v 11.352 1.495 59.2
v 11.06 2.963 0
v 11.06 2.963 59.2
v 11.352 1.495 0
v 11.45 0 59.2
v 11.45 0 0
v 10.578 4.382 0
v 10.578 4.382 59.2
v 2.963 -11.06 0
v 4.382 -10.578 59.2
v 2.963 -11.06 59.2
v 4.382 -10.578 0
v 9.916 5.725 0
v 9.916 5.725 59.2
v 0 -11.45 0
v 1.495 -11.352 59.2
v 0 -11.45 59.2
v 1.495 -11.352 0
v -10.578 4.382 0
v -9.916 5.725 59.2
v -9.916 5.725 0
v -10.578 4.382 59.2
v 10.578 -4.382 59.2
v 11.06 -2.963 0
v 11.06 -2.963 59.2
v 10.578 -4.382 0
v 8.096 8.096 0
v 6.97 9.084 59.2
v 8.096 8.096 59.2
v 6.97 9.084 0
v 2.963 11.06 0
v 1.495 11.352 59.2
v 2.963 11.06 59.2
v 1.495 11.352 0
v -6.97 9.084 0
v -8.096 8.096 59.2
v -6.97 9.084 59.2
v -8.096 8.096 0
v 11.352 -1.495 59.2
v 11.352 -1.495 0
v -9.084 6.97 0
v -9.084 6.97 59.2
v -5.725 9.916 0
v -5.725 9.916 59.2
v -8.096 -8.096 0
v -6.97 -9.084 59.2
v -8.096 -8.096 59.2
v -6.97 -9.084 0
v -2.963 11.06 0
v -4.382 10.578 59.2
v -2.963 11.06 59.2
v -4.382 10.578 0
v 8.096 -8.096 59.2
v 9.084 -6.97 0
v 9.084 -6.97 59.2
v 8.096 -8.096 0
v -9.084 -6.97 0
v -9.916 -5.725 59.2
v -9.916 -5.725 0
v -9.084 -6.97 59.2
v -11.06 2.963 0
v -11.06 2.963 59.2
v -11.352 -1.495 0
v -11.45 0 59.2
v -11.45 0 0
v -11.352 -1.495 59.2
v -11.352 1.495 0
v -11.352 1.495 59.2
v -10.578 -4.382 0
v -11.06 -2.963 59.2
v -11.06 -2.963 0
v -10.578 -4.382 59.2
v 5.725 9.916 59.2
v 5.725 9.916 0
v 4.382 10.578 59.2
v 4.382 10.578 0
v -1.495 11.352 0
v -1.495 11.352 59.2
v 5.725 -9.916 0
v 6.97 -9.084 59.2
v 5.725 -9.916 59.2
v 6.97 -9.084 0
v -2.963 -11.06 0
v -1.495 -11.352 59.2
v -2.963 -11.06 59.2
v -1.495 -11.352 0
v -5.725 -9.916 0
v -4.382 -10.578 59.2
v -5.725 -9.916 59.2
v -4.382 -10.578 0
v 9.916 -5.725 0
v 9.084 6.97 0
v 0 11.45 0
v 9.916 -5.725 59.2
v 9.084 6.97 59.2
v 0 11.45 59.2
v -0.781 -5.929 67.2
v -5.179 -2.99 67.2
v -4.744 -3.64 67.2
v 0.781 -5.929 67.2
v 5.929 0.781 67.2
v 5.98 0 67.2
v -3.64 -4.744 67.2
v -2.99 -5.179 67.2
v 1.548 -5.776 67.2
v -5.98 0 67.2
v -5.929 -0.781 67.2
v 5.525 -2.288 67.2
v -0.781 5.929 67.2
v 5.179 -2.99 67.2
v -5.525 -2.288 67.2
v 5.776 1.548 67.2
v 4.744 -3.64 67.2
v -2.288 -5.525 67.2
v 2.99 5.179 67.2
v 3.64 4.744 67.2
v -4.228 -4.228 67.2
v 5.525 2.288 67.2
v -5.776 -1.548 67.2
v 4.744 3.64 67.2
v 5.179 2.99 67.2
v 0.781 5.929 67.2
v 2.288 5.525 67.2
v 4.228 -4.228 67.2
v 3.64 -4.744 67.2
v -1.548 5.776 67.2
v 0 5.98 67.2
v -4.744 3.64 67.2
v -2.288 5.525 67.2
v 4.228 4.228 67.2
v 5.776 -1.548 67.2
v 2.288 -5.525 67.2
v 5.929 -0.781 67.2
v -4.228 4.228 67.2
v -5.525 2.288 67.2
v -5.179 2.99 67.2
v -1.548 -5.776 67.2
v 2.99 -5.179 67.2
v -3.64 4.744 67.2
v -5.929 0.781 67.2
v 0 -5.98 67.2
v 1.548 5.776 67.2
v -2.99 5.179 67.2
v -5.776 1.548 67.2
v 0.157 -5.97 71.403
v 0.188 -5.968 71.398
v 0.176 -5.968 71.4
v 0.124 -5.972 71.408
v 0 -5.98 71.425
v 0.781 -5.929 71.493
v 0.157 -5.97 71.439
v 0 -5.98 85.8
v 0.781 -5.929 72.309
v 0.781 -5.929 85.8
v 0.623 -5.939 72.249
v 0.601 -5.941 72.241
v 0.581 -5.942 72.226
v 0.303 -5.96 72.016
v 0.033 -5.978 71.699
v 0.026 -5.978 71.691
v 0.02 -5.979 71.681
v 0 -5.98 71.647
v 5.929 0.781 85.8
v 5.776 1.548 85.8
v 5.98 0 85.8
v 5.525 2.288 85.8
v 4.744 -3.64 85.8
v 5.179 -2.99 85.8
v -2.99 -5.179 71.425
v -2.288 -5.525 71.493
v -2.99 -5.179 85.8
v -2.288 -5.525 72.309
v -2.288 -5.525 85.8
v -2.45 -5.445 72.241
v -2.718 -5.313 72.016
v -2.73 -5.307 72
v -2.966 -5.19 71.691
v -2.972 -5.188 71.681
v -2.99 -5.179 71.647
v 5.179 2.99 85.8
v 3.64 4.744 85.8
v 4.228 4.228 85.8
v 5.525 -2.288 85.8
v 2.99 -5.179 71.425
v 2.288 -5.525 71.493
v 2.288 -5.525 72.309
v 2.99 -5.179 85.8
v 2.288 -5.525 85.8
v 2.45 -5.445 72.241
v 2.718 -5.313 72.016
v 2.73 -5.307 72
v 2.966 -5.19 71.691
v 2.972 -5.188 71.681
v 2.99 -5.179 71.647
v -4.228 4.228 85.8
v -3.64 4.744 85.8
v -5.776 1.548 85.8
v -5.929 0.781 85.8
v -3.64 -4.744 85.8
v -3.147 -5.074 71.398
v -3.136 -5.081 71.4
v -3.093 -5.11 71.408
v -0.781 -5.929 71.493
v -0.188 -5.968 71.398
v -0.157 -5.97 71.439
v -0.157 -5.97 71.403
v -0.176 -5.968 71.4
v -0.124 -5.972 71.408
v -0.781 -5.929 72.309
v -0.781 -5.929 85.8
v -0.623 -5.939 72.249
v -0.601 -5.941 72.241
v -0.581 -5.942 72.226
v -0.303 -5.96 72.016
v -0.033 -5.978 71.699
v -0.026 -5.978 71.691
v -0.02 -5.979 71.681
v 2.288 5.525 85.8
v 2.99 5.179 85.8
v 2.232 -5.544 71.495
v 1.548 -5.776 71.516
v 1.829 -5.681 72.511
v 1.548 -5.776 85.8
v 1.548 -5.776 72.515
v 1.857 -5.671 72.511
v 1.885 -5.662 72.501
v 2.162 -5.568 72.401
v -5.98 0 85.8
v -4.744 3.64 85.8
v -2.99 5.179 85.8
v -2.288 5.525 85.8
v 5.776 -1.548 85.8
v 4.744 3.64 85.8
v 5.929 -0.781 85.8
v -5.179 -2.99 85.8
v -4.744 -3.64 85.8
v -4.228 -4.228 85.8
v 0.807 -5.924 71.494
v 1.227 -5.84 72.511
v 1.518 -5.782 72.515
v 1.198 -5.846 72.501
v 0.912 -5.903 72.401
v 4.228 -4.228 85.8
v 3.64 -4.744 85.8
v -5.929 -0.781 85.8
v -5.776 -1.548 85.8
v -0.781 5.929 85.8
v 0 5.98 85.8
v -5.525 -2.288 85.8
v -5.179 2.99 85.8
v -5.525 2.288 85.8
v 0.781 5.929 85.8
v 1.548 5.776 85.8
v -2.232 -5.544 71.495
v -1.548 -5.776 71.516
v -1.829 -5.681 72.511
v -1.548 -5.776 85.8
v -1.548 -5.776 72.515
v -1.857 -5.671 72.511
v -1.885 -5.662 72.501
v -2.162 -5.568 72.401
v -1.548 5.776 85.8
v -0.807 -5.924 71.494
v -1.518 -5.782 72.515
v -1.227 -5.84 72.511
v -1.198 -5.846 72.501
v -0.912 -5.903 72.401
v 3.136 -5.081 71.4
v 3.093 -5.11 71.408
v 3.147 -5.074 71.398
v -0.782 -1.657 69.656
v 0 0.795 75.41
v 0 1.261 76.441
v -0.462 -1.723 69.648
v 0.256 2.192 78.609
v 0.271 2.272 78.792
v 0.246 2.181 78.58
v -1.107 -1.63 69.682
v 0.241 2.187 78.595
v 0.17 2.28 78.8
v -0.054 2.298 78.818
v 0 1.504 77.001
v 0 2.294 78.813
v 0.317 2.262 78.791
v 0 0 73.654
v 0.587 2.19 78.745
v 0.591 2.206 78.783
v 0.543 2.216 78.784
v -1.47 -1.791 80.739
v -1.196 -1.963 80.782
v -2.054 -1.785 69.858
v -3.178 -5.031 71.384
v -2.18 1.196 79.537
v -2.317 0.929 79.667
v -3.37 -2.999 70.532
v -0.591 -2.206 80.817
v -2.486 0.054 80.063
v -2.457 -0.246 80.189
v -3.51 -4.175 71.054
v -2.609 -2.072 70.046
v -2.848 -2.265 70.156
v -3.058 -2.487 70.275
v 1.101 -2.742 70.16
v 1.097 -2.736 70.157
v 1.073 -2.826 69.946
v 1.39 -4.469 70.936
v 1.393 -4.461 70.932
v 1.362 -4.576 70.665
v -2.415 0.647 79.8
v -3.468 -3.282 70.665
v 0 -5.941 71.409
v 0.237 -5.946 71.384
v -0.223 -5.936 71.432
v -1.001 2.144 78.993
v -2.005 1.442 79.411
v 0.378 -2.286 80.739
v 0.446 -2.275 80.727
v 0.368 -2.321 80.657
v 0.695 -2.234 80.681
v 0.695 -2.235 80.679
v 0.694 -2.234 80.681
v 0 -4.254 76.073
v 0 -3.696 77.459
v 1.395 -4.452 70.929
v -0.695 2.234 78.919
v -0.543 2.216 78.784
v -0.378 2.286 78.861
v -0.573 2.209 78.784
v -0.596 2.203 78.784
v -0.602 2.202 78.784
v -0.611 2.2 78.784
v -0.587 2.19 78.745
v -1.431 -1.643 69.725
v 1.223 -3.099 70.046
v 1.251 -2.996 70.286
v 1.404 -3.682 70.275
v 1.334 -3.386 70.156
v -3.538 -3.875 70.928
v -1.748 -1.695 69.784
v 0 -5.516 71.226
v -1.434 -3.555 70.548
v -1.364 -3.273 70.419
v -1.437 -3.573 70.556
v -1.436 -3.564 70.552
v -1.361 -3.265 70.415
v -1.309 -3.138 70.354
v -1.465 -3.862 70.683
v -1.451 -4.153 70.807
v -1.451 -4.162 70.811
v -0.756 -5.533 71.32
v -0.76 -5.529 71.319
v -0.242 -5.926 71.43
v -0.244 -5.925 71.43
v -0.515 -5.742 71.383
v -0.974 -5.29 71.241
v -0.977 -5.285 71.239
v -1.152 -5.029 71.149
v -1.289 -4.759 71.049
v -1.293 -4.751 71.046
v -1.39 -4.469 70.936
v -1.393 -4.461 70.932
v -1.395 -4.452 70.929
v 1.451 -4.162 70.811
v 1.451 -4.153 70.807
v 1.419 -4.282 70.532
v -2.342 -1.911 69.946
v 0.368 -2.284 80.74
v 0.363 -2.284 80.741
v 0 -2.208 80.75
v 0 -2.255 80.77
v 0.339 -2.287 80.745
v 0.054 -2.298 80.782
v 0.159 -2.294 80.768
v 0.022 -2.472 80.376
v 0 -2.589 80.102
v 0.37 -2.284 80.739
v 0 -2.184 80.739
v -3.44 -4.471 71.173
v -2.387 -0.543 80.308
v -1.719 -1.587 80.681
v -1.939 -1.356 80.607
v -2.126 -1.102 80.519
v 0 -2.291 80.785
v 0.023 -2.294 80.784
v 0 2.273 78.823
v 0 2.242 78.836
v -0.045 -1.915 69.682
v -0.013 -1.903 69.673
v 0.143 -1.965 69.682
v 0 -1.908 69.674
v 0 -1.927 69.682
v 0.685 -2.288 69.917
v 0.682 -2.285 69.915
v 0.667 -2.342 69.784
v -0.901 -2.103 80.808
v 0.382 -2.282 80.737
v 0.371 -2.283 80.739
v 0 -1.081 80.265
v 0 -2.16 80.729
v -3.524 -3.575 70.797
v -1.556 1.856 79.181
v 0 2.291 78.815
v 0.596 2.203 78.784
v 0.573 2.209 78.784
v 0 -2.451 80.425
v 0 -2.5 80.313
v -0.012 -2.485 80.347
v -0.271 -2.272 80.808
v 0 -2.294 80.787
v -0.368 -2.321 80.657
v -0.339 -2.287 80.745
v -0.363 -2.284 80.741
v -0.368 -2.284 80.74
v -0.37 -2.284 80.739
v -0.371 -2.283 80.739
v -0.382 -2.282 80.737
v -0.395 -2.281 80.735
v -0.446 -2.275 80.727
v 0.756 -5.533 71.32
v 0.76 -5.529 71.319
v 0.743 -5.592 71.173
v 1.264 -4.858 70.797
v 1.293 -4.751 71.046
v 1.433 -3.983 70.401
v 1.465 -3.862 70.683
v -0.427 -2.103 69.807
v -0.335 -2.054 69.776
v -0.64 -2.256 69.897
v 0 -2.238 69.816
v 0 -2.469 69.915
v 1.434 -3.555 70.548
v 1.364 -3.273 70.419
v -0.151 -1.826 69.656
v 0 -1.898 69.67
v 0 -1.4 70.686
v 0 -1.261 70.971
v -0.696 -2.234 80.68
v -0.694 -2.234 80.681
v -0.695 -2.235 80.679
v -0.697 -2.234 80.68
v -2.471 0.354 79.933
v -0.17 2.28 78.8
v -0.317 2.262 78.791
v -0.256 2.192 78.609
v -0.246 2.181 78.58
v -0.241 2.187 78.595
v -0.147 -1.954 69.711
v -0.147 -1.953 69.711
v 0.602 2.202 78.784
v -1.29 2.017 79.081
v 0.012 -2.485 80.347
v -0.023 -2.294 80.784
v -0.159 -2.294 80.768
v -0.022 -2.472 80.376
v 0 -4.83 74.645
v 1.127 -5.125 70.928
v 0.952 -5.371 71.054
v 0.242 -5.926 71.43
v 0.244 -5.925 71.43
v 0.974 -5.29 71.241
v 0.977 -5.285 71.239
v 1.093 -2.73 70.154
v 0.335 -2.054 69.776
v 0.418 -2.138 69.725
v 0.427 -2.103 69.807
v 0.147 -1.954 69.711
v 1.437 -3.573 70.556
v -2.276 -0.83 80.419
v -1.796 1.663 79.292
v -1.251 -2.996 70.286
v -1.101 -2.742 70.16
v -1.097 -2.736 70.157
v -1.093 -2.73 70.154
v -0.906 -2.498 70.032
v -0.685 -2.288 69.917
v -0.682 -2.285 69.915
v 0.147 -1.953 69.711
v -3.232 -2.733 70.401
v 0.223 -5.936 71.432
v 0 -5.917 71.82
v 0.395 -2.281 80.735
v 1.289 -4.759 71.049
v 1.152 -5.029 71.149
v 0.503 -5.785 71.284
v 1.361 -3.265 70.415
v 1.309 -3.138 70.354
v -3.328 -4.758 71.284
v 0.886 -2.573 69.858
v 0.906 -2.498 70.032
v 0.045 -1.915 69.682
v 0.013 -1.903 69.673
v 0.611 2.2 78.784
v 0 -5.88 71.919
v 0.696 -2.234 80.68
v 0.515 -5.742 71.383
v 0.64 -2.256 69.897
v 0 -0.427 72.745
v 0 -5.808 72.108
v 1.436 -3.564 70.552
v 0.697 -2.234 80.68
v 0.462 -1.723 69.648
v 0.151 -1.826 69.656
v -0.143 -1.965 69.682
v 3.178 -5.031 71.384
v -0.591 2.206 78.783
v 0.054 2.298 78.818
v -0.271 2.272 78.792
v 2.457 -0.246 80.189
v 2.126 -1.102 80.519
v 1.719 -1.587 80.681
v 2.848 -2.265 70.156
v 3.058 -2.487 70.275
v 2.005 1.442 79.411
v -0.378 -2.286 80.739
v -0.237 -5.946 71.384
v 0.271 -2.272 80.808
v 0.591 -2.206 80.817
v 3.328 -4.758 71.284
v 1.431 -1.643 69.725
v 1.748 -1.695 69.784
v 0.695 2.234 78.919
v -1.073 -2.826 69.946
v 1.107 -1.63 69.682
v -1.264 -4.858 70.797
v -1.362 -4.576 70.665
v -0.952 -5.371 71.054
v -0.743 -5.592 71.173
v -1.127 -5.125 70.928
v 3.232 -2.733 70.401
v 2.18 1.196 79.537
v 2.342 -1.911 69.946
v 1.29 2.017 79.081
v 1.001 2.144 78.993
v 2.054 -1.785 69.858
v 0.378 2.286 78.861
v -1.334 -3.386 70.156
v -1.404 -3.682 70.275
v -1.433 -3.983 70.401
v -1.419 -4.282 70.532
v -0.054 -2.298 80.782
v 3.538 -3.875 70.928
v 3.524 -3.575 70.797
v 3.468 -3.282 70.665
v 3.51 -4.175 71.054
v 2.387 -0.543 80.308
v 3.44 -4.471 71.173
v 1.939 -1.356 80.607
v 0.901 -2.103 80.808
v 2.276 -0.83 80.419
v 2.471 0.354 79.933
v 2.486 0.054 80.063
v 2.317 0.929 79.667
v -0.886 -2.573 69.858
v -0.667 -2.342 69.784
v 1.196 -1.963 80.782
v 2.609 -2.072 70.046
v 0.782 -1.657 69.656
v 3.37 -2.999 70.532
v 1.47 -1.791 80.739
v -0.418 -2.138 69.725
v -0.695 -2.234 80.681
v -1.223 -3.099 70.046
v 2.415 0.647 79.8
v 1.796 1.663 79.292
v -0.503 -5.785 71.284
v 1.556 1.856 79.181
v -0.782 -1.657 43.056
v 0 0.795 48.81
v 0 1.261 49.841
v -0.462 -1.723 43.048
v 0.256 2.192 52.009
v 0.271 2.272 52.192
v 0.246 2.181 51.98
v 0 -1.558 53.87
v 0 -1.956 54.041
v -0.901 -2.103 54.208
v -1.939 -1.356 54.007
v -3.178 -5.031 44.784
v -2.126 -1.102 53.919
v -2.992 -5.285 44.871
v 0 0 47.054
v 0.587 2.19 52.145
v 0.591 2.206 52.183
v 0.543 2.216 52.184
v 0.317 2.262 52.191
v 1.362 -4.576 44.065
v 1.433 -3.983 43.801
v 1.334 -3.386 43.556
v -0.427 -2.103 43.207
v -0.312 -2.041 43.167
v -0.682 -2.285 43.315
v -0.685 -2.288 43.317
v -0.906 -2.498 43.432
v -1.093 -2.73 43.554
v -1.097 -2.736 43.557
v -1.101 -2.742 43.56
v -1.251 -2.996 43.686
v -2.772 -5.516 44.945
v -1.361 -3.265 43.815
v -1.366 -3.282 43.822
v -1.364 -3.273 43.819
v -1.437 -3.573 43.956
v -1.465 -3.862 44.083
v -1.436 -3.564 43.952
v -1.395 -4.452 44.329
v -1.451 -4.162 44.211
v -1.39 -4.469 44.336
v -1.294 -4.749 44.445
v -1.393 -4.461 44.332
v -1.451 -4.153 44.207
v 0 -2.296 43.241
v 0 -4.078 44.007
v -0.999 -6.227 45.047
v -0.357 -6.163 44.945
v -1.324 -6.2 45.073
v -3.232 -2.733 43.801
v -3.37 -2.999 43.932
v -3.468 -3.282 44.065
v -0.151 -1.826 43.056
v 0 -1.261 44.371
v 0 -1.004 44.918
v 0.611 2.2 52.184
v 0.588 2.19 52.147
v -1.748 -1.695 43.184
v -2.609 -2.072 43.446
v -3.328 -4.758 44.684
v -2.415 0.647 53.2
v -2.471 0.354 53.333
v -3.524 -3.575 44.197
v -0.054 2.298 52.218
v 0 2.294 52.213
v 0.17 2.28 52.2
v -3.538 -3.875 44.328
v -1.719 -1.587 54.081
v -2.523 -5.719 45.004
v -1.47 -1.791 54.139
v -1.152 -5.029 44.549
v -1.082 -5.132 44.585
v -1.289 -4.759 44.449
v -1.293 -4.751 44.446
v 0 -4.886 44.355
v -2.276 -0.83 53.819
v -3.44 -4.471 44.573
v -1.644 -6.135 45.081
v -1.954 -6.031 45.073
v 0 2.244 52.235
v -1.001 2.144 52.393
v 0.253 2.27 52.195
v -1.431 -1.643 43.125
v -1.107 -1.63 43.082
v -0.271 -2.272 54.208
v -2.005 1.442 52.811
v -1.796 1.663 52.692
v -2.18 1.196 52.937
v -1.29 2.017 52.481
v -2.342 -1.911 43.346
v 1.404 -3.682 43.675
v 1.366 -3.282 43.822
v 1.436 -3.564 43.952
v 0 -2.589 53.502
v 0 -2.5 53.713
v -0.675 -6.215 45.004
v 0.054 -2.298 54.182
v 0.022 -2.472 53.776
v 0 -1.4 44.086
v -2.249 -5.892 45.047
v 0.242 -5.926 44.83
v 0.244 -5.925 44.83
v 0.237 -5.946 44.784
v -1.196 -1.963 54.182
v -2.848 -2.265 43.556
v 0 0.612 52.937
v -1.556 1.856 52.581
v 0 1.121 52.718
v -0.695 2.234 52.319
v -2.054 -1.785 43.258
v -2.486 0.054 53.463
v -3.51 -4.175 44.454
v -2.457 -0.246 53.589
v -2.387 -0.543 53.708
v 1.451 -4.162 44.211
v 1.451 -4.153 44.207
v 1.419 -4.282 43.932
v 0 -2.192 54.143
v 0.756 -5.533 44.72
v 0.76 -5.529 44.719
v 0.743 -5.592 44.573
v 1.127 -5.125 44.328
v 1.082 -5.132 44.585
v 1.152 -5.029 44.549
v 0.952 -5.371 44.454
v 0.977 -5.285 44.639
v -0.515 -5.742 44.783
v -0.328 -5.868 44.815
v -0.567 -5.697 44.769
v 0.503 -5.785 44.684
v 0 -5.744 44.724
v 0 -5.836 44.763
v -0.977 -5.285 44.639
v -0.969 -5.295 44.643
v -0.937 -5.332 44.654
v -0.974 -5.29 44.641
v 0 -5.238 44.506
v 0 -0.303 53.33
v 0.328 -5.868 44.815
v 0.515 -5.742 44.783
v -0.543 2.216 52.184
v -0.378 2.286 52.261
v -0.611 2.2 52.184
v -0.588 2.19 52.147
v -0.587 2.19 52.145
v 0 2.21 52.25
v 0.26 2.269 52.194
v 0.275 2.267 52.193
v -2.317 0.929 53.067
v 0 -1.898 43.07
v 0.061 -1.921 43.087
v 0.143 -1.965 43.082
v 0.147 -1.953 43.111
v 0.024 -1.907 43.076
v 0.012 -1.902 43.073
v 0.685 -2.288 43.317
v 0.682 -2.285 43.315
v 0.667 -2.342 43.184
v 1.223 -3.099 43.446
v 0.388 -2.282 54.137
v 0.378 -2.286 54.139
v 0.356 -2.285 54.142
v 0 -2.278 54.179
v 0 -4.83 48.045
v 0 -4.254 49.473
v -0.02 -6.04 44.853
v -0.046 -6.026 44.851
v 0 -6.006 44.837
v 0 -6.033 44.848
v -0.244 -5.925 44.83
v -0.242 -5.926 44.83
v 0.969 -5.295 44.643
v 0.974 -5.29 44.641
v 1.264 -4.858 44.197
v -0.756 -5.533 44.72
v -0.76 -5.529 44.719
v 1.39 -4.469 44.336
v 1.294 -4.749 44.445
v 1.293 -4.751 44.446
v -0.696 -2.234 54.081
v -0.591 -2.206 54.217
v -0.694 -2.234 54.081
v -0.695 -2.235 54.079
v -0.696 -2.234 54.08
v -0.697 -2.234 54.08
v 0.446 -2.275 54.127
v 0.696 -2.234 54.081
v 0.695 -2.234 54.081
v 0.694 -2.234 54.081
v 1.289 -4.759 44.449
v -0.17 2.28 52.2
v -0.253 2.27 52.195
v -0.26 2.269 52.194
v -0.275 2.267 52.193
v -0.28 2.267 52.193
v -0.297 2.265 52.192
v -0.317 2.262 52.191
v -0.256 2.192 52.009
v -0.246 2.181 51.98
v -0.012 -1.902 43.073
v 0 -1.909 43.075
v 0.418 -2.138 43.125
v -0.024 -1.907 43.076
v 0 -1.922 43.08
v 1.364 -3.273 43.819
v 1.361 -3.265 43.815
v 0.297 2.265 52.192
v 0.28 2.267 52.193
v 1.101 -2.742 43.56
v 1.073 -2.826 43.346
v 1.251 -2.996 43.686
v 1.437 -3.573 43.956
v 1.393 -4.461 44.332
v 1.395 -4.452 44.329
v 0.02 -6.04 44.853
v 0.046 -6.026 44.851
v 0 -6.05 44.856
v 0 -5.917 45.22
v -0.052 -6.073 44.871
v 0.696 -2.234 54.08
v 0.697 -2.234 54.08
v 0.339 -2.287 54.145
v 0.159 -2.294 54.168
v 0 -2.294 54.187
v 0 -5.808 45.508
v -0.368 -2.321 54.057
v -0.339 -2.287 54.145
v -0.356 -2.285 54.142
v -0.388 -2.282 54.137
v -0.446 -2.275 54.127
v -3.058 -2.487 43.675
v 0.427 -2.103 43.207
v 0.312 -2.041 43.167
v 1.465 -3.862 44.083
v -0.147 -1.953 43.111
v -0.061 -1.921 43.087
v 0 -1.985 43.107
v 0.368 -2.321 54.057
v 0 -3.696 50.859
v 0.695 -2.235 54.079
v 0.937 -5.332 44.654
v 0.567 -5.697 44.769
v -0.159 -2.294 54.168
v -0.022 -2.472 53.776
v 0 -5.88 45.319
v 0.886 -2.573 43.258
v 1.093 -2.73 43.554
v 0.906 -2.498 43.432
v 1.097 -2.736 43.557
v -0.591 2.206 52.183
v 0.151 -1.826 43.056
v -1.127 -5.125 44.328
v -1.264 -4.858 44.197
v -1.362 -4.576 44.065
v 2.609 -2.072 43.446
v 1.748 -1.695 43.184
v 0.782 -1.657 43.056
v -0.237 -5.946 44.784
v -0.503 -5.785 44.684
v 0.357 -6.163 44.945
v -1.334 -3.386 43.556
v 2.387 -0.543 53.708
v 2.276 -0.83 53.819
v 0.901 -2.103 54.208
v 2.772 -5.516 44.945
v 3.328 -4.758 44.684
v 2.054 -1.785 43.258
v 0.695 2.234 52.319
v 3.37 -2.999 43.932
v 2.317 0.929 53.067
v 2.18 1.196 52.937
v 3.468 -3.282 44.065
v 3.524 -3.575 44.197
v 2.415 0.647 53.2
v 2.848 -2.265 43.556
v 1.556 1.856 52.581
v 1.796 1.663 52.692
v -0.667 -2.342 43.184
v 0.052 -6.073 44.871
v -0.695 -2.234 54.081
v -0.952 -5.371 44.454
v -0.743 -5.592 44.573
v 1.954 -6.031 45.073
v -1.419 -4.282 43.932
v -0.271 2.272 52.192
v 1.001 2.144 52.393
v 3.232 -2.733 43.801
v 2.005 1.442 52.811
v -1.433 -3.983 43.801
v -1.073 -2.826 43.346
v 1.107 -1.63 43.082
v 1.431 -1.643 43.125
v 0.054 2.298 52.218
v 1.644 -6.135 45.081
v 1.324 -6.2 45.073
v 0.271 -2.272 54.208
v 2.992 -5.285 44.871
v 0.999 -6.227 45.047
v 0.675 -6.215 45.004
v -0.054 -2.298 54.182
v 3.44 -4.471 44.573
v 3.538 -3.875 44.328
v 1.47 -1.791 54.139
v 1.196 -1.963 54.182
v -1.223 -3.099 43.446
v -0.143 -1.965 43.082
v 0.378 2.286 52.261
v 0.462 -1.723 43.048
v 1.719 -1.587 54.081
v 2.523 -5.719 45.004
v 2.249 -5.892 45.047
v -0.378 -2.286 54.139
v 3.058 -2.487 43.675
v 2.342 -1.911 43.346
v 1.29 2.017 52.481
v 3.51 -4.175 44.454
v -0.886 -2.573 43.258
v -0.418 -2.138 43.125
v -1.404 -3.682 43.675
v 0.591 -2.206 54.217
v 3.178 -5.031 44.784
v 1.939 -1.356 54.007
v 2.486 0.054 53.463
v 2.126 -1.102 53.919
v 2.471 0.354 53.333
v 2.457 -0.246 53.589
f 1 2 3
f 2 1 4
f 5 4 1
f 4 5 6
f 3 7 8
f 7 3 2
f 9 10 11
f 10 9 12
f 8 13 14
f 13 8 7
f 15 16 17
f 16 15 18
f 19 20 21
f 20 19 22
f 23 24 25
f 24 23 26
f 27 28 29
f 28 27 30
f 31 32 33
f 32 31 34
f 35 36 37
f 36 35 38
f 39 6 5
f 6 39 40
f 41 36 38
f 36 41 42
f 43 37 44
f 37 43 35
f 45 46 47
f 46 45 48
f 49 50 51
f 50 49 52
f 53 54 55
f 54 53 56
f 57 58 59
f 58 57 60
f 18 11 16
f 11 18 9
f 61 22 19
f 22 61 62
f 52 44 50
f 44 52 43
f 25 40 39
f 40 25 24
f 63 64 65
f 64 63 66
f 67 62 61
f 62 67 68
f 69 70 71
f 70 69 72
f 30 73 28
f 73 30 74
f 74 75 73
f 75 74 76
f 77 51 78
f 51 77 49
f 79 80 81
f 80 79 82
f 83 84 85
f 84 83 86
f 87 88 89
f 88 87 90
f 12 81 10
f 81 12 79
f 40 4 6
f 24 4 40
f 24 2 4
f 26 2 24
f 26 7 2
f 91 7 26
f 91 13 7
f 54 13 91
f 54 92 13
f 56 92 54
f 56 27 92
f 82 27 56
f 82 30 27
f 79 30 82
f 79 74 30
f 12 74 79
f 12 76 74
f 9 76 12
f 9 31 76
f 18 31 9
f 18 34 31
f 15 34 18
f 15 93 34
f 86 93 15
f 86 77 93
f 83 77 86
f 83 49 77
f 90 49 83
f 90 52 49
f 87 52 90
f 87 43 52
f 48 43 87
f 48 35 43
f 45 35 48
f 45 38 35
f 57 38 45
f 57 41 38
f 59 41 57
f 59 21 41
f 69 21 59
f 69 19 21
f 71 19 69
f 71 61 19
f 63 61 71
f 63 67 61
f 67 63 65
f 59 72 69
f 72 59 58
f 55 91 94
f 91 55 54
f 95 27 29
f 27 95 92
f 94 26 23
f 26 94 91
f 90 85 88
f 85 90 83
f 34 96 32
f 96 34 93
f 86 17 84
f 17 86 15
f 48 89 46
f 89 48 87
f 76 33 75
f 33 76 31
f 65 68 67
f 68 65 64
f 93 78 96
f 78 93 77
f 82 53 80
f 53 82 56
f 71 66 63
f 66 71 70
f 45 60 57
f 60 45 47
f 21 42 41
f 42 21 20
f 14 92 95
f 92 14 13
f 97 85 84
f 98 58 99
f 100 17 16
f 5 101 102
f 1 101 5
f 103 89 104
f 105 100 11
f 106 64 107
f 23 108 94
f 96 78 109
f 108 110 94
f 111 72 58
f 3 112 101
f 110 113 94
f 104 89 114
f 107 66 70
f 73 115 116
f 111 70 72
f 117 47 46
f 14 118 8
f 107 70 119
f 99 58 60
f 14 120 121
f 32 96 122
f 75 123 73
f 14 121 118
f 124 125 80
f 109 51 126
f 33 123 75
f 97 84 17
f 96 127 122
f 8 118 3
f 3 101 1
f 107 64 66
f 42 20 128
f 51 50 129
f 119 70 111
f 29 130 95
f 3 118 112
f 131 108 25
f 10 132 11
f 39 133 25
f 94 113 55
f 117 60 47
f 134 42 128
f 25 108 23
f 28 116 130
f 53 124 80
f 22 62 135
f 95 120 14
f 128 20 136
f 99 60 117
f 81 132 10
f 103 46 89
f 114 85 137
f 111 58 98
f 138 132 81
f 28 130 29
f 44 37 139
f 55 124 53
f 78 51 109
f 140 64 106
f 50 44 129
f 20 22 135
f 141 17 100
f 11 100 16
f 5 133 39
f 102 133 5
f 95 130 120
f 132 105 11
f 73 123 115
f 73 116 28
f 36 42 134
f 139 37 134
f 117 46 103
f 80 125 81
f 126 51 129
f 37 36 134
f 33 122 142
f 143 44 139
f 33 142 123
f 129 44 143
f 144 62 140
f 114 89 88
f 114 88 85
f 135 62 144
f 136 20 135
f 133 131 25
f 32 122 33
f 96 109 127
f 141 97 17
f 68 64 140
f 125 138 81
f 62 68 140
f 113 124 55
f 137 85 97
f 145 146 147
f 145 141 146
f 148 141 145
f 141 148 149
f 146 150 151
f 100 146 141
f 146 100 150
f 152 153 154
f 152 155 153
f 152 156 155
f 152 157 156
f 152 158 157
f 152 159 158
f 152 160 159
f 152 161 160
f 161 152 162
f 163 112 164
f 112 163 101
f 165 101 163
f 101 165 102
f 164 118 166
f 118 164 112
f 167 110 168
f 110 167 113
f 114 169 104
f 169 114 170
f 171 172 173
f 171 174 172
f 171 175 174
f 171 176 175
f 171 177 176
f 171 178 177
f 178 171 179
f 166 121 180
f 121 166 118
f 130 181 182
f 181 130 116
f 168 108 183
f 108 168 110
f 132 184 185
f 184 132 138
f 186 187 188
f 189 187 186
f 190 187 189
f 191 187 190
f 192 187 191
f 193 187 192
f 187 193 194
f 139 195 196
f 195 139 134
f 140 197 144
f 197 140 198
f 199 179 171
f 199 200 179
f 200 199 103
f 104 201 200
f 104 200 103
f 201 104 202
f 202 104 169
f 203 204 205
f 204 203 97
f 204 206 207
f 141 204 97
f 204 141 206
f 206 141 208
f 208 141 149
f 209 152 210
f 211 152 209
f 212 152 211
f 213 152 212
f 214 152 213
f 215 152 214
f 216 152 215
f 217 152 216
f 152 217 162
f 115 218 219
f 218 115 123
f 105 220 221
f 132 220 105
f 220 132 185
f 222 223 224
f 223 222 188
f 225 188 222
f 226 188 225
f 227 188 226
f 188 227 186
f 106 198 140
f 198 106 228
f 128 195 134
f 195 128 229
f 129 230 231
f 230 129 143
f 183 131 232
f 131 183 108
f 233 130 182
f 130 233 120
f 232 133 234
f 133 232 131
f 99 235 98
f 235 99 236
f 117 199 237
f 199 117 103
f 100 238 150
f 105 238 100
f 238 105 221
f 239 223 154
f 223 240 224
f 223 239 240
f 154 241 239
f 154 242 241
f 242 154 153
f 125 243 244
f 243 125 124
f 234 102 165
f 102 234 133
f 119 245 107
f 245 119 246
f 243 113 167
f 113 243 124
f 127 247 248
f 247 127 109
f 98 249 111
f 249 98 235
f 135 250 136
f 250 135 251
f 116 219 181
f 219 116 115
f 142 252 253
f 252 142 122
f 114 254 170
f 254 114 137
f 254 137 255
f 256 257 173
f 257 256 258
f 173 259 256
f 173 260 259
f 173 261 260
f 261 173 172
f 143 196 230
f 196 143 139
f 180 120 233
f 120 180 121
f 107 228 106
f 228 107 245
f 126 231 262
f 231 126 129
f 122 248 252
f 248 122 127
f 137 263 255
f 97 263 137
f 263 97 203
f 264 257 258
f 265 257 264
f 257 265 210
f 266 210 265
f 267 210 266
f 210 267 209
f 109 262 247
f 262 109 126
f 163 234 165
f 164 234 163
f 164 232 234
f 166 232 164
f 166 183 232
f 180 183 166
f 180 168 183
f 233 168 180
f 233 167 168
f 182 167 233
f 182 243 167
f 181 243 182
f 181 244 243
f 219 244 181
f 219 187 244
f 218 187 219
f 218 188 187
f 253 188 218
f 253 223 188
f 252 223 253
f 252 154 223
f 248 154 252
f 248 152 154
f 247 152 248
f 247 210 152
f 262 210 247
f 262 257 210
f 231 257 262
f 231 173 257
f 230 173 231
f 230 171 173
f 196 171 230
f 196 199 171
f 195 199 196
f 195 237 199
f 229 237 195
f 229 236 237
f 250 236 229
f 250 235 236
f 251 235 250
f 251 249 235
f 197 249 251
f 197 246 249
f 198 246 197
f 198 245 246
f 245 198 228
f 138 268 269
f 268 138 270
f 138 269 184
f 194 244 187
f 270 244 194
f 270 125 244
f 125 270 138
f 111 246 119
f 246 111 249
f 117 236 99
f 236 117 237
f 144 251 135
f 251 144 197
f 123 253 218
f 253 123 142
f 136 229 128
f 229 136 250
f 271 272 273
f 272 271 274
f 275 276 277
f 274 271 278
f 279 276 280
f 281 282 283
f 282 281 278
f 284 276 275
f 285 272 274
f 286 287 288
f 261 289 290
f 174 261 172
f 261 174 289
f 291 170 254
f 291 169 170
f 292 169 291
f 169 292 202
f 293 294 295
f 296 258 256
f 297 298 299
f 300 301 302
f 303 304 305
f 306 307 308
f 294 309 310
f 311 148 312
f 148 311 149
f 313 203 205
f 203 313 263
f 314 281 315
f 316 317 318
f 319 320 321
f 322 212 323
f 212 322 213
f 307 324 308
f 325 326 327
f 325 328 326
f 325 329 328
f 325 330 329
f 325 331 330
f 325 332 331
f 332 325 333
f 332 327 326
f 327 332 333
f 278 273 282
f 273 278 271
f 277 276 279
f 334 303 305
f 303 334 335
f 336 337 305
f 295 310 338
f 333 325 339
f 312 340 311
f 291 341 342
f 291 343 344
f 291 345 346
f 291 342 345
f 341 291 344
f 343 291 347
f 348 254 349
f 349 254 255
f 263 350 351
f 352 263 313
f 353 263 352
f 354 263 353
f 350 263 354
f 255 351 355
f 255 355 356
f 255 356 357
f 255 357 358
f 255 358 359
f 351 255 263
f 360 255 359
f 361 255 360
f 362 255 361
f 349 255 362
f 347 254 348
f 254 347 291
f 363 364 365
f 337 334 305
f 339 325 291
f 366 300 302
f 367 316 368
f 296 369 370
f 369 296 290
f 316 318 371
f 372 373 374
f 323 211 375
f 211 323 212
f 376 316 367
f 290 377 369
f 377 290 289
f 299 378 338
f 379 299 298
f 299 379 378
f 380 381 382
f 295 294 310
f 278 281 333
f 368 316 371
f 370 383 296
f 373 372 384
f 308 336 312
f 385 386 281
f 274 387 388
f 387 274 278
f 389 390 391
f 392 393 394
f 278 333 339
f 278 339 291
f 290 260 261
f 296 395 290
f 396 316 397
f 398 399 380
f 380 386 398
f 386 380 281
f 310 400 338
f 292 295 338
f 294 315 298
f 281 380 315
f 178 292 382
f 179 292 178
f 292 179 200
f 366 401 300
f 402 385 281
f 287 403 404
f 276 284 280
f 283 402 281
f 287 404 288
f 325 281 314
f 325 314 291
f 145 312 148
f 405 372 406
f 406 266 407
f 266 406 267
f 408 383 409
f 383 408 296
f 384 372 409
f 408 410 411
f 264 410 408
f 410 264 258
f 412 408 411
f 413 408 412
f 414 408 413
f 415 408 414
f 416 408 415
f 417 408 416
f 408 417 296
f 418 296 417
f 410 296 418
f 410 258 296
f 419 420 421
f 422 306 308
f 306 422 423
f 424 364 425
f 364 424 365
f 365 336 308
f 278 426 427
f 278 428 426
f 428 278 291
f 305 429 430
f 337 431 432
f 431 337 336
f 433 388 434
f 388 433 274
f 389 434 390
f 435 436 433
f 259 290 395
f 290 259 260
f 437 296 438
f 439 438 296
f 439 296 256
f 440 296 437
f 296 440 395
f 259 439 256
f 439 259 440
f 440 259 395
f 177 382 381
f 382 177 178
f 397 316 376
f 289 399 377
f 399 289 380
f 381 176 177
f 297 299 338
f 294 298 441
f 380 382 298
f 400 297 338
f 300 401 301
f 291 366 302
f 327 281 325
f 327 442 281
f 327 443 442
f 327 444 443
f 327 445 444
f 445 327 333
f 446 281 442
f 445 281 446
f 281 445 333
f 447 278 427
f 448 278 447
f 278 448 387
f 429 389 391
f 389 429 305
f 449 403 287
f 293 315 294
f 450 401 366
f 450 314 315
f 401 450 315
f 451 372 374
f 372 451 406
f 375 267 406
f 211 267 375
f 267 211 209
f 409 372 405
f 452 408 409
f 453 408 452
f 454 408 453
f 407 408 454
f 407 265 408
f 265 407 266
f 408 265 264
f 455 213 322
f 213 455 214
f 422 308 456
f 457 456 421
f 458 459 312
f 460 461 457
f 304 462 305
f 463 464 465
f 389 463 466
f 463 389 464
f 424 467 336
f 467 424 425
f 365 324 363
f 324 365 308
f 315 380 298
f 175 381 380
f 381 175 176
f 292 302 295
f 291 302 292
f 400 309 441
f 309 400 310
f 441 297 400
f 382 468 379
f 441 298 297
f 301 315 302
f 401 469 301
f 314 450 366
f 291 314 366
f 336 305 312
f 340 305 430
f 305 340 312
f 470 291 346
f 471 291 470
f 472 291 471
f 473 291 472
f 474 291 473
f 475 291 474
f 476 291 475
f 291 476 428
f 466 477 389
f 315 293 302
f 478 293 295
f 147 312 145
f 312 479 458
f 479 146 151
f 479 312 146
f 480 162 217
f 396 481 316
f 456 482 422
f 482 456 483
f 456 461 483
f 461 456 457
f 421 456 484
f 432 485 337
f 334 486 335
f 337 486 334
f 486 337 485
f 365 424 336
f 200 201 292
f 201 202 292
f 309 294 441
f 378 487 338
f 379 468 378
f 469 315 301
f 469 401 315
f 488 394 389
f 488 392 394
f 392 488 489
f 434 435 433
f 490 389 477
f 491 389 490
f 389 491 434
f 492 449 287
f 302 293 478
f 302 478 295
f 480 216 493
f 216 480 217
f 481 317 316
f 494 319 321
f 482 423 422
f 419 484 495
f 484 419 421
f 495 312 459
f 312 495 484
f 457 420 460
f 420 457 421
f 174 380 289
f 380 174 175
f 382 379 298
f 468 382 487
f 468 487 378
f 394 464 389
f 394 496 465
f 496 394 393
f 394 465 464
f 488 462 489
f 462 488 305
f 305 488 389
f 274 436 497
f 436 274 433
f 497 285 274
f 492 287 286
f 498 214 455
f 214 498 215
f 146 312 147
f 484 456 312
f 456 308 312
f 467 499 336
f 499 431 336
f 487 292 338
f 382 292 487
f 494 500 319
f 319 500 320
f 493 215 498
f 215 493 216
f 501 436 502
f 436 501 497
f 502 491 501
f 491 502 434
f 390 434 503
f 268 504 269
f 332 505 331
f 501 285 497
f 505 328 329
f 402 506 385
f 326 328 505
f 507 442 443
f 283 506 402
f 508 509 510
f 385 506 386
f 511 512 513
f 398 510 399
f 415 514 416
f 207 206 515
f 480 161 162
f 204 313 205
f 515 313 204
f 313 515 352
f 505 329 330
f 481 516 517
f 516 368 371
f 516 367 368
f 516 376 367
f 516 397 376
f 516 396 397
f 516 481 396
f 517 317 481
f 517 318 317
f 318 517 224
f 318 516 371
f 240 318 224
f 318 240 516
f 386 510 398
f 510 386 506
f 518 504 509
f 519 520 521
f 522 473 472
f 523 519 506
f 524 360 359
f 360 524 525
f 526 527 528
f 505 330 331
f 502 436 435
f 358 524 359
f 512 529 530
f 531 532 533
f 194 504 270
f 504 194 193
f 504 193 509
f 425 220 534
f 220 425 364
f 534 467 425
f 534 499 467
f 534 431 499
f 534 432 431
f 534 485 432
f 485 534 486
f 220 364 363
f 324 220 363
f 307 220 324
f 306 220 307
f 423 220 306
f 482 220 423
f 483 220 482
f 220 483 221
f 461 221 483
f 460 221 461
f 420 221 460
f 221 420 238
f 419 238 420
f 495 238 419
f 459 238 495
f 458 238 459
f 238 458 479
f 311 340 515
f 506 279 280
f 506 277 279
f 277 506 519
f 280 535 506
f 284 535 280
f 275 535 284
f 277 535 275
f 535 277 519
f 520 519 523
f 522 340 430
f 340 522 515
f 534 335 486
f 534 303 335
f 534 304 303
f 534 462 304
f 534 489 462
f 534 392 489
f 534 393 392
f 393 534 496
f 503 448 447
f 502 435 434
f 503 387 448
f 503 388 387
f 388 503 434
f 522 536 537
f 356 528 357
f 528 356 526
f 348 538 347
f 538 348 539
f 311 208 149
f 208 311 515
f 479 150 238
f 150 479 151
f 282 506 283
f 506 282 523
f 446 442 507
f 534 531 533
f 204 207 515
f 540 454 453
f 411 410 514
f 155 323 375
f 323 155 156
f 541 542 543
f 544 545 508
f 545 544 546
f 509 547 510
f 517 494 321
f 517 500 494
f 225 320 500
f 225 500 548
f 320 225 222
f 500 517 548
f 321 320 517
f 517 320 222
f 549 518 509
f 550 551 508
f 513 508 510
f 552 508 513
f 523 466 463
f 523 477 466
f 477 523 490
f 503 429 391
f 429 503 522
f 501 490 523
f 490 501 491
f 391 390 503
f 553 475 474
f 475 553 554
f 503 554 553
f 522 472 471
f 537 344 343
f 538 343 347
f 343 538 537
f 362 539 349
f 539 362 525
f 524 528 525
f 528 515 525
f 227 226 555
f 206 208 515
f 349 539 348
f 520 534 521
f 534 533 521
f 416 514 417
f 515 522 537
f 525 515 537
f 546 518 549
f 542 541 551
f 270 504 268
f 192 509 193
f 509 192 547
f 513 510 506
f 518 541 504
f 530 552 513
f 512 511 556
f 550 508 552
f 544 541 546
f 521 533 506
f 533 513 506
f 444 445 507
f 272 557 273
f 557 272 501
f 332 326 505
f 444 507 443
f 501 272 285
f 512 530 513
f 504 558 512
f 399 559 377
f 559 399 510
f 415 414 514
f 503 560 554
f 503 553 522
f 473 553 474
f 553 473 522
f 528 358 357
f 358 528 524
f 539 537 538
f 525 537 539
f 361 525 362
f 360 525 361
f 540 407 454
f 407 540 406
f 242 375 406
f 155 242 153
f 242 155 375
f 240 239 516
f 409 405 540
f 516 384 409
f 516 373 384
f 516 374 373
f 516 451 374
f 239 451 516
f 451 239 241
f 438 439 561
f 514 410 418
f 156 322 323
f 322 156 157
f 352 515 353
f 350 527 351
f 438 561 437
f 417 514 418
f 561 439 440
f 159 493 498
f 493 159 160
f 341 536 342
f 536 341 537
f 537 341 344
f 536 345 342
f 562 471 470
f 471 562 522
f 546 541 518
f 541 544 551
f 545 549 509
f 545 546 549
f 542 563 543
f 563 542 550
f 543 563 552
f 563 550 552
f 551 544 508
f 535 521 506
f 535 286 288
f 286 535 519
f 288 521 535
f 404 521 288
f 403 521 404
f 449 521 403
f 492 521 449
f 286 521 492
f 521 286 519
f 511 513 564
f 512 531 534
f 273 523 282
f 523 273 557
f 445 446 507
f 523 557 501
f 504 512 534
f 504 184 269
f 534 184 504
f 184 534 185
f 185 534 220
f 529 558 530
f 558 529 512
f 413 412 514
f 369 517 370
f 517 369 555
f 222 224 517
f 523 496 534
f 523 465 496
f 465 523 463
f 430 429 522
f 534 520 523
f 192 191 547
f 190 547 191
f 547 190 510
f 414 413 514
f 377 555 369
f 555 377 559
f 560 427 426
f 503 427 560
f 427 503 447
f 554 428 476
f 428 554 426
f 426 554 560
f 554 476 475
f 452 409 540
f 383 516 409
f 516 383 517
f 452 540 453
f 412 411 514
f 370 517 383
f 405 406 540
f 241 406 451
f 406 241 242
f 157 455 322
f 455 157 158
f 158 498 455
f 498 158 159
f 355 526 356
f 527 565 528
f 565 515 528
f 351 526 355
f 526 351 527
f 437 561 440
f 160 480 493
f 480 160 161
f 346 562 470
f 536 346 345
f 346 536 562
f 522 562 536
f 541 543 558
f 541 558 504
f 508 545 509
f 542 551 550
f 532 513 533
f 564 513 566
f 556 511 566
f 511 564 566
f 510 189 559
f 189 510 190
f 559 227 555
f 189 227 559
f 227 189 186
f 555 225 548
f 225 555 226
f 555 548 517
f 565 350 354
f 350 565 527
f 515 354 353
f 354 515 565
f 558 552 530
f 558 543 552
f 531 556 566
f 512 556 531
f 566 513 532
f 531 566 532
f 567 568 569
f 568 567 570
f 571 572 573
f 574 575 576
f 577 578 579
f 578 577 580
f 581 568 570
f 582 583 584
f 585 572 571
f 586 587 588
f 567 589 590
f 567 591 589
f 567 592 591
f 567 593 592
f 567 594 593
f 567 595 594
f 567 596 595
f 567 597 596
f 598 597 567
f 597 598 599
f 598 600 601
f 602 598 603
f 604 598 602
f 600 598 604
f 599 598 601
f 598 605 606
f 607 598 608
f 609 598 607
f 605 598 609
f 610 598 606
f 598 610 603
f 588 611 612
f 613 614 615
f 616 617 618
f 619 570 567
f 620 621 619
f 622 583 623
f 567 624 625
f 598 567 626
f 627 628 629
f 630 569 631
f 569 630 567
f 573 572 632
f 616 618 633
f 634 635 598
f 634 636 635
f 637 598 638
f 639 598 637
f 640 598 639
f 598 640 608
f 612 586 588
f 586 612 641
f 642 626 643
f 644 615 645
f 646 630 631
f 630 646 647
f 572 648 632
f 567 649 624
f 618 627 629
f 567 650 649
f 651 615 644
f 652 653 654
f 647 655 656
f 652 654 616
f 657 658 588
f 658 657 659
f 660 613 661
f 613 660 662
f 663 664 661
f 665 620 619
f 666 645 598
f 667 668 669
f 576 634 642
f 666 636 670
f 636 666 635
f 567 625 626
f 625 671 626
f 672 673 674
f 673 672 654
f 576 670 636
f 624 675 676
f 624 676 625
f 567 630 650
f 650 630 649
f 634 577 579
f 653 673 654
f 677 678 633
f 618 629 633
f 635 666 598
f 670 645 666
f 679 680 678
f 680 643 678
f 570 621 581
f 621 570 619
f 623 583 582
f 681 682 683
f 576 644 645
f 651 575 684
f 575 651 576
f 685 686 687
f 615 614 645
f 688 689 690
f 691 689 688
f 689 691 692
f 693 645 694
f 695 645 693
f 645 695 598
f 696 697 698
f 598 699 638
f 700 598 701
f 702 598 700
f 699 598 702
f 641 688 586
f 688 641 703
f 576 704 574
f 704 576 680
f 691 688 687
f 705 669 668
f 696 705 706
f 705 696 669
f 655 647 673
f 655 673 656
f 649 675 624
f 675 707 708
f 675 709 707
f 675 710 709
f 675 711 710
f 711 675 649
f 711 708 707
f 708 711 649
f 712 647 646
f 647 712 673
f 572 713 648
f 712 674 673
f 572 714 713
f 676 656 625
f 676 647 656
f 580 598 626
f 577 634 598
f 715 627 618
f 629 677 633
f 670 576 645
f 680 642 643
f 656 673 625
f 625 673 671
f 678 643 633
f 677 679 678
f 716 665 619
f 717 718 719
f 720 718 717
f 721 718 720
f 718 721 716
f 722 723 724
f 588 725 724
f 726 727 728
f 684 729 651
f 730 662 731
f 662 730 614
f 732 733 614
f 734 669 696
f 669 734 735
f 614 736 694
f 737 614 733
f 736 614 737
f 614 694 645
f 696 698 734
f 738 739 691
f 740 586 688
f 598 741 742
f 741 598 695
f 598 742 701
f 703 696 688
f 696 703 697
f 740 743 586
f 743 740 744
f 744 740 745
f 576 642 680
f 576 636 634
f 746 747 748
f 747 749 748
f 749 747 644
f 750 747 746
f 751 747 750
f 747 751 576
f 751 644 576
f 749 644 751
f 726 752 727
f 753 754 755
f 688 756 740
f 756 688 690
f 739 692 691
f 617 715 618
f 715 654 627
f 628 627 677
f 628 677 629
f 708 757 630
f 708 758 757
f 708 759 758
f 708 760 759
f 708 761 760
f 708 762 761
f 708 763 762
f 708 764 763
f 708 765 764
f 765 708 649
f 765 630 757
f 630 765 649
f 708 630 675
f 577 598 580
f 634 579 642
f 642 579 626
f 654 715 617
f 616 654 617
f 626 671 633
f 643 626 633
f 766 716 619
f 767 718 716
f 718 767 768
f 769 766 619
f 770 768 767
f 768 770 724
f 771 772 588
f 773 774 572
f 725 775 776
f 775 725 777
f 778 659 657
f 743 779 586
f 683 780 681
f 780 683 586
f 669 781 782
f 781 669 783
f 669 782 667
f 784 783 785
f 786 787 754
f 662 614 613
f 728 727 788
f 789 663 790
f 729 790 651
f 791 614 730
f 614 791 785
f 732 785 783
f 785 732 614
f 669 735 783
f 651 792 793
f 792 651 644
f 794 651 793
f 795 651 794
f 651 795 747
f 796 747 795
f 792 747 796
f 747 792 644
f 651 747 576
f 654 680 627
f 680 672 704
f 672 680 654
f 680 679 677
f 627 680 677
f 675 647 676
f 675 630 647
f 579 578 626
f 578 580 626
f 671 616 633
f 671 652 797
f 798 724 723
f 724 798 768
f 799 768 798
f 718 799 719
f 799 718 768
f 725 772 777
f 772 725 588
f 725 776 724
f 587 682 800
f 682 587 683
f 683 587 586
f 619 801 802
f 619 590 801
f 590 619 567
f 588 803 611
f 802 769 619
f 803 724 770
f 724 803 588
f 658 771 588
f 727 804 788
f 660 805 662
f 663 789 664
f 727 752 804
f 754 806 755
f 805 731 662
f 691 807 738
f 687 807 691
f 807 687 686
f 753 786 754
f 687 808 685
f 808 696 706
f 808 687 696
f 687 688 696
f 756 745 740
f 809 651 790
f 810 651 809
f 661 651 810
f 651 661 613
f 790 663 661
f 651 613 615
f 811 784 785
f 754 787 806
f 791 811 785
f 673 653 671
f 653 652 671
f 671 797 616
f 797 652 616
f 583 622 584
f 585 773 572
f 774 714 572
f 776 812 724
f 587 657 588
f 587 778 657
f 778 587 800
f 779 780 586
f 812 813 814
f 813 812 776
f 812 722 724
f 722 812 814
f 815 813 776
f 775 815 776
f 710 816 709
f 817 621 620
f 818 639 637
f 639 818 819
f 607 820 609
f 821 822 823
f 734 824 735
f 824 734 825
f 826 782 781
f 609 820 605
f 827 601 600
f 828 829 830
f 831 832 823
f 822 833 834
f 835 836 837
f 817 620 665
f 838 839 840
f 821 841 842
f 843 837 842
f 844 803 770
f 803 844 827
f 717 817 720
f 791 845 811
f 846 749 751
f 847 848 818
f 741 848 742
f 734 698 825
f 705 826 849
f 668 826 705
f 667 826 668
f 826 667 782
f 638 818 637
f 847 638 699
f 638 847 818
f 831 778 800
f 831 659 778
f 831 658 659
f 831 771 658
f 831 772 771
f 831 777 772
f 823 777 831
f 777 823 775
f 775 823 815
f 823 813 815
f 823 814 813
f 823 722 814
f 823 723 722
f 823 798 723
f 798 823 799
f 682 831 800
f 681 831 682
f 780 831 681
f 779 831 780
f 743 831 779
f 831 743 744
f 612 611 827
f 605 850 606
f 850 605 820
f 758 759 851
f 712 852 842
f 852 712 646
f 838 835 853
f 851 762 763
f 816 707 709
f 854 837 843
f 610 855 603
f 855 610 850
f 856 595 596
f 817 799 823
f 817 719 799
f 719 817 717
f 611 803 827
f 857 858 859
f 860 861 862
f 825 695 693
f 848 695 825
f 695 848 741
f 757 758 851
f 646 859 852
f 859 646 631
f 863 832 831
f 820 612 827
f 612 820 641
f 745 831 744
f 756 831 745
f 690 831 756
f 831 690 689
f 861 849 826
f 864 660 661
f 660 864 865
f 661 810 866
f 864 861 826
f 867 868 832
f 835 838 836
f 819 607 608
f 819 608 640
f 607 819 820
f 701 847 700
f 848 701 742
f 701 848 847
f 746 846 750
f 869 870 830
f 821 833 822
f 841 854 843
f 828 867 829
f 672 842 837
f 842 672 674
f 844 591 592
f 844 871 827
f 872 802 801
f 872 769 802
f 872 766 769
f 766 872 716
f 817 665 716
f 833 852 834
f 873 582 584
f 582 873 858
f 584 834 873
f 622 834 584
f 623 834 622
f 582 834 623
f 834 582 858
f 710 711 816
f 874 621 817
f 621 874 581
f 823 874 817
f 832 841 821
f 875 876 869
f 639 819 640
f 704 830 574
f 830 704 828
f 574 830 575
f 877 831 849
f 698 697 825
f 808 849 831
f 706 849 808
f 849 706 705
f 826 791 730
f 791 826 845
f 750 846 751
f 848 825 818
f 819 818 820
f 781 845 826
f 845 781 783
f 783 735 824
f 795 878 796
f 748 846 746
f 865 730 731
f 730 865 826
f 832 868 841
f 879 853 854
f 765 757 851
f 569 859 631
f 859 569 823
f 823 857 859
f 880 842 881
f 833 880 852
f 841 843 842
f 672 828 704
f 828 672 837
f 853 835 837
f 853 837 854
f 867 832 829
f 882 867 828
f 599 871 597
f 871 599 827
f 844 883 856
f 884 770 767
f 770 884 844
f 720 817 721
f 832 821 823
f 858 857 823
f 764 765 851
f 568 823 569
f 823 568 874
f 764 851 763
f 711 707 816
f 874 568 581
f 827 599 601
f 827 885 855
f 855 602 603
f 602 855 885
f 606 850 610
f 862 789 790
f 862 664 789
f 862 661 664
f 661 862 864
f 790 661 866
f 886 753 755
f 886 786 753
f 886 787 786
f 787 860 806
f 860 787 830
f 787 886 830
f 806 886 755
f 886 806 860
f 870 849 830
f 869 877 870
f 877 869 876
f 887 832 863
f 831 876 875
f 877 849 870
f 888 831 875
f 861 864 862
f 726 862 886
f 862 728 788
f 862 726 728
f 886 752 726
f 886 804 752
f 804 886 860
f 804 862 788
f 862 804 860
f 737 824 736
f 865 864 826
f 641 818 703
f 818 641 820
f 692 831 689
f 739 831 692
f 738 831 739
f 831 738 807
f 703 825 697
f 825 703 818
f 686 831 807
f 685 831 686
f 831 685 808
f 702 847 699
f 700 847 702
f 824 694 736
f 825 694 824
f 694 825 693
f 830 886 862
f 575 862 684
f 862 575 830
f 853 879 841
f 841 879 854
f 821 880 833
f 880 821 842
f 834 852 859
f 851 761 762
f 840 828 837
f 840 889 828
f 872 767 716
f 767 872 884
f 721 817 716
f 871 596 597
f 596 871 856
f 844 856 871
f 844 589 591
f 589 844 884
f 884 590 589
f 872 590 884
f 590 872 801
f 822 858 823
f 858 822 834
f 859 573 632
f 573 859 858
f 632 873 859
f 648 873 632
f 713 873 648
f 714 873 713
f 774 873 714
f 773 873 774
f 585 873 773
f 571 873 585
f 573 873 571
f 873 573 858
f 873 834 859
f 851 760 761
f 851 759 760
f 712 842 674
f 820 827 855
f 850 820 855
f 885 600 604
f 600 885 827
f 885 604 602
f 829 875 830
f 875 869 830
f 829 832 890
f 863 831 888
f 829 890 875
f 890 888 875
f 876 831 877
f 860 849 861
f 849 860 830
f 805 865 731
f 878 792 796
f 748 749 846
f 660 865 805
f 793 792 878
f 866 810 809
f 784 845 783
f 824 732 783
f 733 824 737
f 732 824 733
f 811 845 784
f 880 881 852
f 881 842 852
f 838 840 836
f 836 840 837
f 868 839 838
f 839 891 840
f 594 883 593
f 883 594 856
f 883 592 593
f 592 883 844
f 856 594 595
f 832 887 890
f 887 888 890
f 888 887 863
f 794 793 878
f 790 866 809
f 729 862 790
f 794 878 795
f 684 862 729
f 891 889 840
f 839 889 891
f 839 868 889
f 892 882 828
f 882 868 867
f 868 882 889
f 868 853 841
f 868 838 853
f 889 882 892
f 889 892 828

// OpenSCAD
// ===========================================================================
// HULL-FRAME COORDINATE STANDARD - Rev R1 (2026-06-11).  See CLAUDE.md.
//   This part is modeled in a PART-LOCAL frame (vertical axis = local Z,
//   foot at Z=0); NOT a primary-component STL; do NOT bake with
//   bake_hull_frame.py.
// ===========================================================================
// ===========================================================================
// wire_brace_leg.scad
// Serenity UAV -- Rev R5 -- Strong-Leg vertical post + 4-wire brace
// ===========================================================================
//
// *** RETIRED 2026-07-21 -- superseded by Rev R6 ***
// The Rev R5 post geometry descended from the misubisu Thingiverse leg,
// which does not resemble the canonical Serenity landing gear.  Rev R6
// (airframe/openscad/fuselage/canonical_leg_r6_3_0in.scad, THE FLIGHT
// ARTICLE since 2026-09-06; also canonical_leg_r6_1_5in.scad, RETIRED to
// bench/ground-handling use) rebuilds the leg
// to the canonical articulated form at the canonical bay stations while
// keeping this file's spring + ductile bowed-wire mechanism (the
// bowed_wire sweep is carried forward there with its face winding
// corrected).  This file is kept for reference only; its rendered STLs
// were moved to archives/airframe-archives/archive/stls/fuselage/
// landing-gear/ (see ARCHIVE_INDEX.md).  Analysis history:
// docs/LANDING_GEAR_ANALYSIS.md Rev R6 header.
// ===========================================================================
//
// Author  : Steve Griffing, PE(CSE), CISSP-ISSEP, CPP
// Project : Serenity-class Tilt-Rotor UAV (24-inch scale, Firefly TV ship)
// License : CERN-OHL-W-2.0 — see LICENSES/CERN-OHL-W 2.0 (SPDX-License-Identifier: CERN-OHL-W-2.0)
// Date    : 2026-06-20
// Revision: Rev R5
//
// Description
// -----------
// IMPORTANT geometric correction (2026-06-20): the ORIGINAL canonical single-
// blade leg (pre-Strong-Leg) is itself a vertical part with TWO branch
// points -- one AT THE APEX (top) and one about 1/3 of the way down FROM
// THE APEX. The Strong-Leg's duplicate+rotate(30deg)+union therefore
// produces FOUR branch points total (2 at the apex, 2 at the 1/3-down
// point), not a single fork into 2 arms as earlier revisions (R2-R4)
// approximated from a coarser reading of the mesh. Rev R5 models this
// directly and braces the vertical post to the hull at both branch levels:
//
//   APEX socket (2 holes, Z ~= full leg length)        -- 2x SPRING wire
//     (elastic, recoverable; handles ordinary hard landings with zero
//     permanent set; sized for the 1.5 ft elastic-check energy, TODO.md LG-06).
//   1/3-DOWN socket (2 holes, Z ~= 2/3 of the leg length up from the foot)
//                                                        -- 2x DUCTILE wire
//     (plastic, sacrificial; each independently sized for the FULL 6 ft
//     full-AUW per-leg worst-case energy; fires by progressively deepening
//     its pre-formed bow, visibly bent afterward -- field-replaceable).
//
// Both wire types share the same simple "bowed strut" shape: a single
// shallow pre-bend in an otherwise straight wire/rod, NOT a closed loop --
// chosen specifically for manufacturability (forms with a simple bending
// jig or by hand, no precision winding) and field replacement (straight
// stock wire, cut to length, bent over a form block).
//
// All dimensions per docs/LANDING_GEAR_ANALYSIS.md Rev R5 SS4.
//
// Render commands
// ----------------
//   openscad -D 'PART="post"'                    -o post.stl                    wire_brace_leg.scad
//   openscad -D 'PART="spring_wire_nominal"'      -o spring_wire_nominal.stl     wire_brace_leg.scad
//   openscad -D 'PART="spring_wire_deformed"'     -o spring_wire_deformed.stl    wire_brace_leg.scad
//   openscad -D 'PART="ductile_wire_nominal"'     -o ductile_wire_nominal.stl    wire_brace_leg.scad
//   openscad -D 'PART="ductile_wire_deformed"'    -o ductile_wire_deformed.stl   wire_brace_leg.scad
// ===========================================================================

$fn = 48;

// ---------------------------------------------------------------------------
// Post parameters (mm) -- per docs/LANDING_GEAR_ANALYSIS.md Rev R5 SS4.7
// Branch heights match the ORIGINAL canonical single-blade leg's own two
// branch points (apex, and 1/3 of the way down from the apex) -- the
// Strong-Leg's duplicate+rotate+union doubles each into a pair.
// ---------------------------------------------------------------------------
LEG_LEN        = 79.8;             // mm, full leg length (matches the original canonical leg)
POST_FOOT_Z    = 0;
POST_MID_Z     = LEG_LEN * 2.0/3.0;  // ~=53.2mm -- "1/3 down from the apex" branch (ductile pair)
POST_TOP_Z     = LEG_LEN;            // ~=79.8mm -- apex branch (spring pair)

// Cylindrical post, area-equivalent to the Rev R5 square sizing in
// docs/LANDING_GEAR_ANALYSIS.md SS4.6 (20.3x20.3mm / 10.6x10.6mm), per
// user feedback that a round post is preferred over a rectangular one.
POST_LOWER_R = 11.45;      // mm, lower segment radius (foot -> taper start)
POST_UPPER_R = 5.98;       // mm, upper segment radius (taper end -> cap)
POST_TAPER_LEN = 8.0;      // mm, smooth conical taper length (no hard step/ledge)
SOCK_REACH_MARGIN = 6.0;   // mm, clearance kept between a socket's Z reach and the
                            // taper, so bores stay in uniform-diameter material
POST_CAP_CLEARANCE = 6.0;  // mm, extra post material above the apex socket height
                            // so that socket has material on both sides of its bore

TAPER_START_Z = POST_MID_Z + SOCK_REACH_MARGIN;          // ~=59.2mm
TAPER_END_Z   = TAPER_START_Z + POST_TAPER_LEN;          // ~=67.2mm
POST_CAP_Z    = POST_TOP_Z + POST_CAP_CLEARANCE;         // ~=85.8mm, actual printed top

SOCK_D   = 5.0;     // socket bore diameter (wire end + clearance)
SOCK_DEPTH = 10.0;  // socket depth
LEAN_ANG = 24.0;    // deg from vertical, both wire pairs
AZ_SPLIT = 15.0;    // deg, +/- azimuth split within each pair (30 deg apart)

// ---------------------------------------------------------------------------
// Wire parameters -- bowed strut, single shallow pre-bend.
// Apex (spring) wires are LONGER and 1/3-down (ductile) wires SHORTER,
// proportioned similarly to the retired Rev R1.4 V-brace's upper:lower
// strut ratio (77.6:53.9mm) -- the apex branch reaches further out to a
// higher hull attachment, the 1/3-down branch to a closer one.
// ---------------------------------------------------------------------------
SPRING_L       = 45.0;     // mm, apex (spring) wire chord length
DUCTILE_L      = 30.0;     // mm, 1/3-down (ductile) wire chord length

SPRING_D       = 3.17;     // mm, spring wire diameter
SPRING_H_NOM   = 3.5;      // mm, nominal (undeformed) sag
SPRING_H_DEF   = 10.5;     // mm, deformed (post-overload) sag -- NOTE: spring wire is
                            // elastic and should NOT take a permanent set in normal
                            // service; this deformed variant exists only to illustrate
                            // the bow-deepening mechanism for review, see TODO LG-06.

DUCTILE_D      = 4.35;     // mm, ductile wire diameter
DUCTILE_H_NOM  = 3.5;      // mm, nominal (undeformed) sag
DUCTILE_H_DEF  = 10.5;     // mm, deformed (fired) sag -- the field-inspection
                            // "this fuse has activated, replace it" shape.

PART = "post";   // override with -D on the CLI

// ---------------------------------------------------------------------------
// Bowed wire strut: a round-wire rod of length L (chord) with a shallow
// circular-arc pre-bend of rise h at its midpoint, lying in the local XZ
// plane (chord along local Z). Built as a single polyhedron tube swept
// along the bow path (fast -- avoids chaining many hull() operations,
// which is extremely slow in OpenSCAD's CGAL backend).
// ---------------------------------------------------------------------------
module bowed_wire(d, L, h) {
    n = 16;          // path segments -- coarse is fine, the bow is shallow
    sides = 8;        // sides per tube cross-section
    r = d / 2;

    path = [for (i = [0 : n]) let (
        t = i / n,
        z = (t - 0.5) * L,
        x = h * (1 - pow(2*t - 1, 2))
    ) [x, 0, z]];

    // local tangent direction at each path point (for a perpendicular ring)
    tangents = [for (i = [0 : n]) let (
        i0 = max(i - 1, 0),
        i1 = min(i + 1, n),
        dv = path[i1] - path[i0]
    ) dv / norm(dv)];

    // build an orthonormal frame (tangent, u, v) at each point, then a ring
    // of `sides` points around it, radius r
    rings = [for (i = [0 : n]) let (
        t = tangents[i],
        arbitrary = (abs(t[1]) < 0.9) ? [0, 1, 0] : [1, 0, 0],
        u = cross(t, arbitrary) / norm(cross(t, arbitrary)),
        v = cross(t, u)
    ) [for (j = [0 : sides - 1]) let (
        ang = 2 * PI * j / sides
    ) path[i] + r * (u * cos(ang * 180 / PI) + v * sin(ang * 180 / PI))]];

    points = [for (i = [0 : n]) for (j = [0 : sides - 1]) rings[i][j]];

    side_faces = [for (i = [0 : n - 1]) for (j = [0 : sides - 1]) let (
        a = i * sides + j,
        b = i * sides + (j + 1) % sides,
        c = (i + 1) * sides + (j + 1) % sides,
        d2 = (i + 1) * sides + j
    ) each [[a, b, c], [a, c, d2]]];

    cap_start = [for (j = [sides - 1 : -1 : 0]) j];
    cap_end_base = n * sides;
    cap_end = [for (j = [0 : sides - 1]) cap_end_base + j];

    faces = concat(side_faces, [cap_start], [cap_end]);

    polyhedron(points = points, faces = faces, convexity = 4);
}

// ---------------------------------------------------------------------------
// Simplified vertical post: round (cylindrical) column, foot at Z=0, with a
// smooth conical taper between the wider lower segment and the narrower
// upper segment (no hard ledge/step), and 4 angled socket bores (2 near
// POST_TOP_Z for the spring pair, 2 near POST_MID_Z for the ductile pair),
// each bored at LEAN_ANG from vertical, split +/-AZ_SPLIT in azimuth within
// its pair. Both socket heights are kept clear of the taper zone (see
// TAPER_START_Z/TAPER_END_Z) so each bore lands in uniform-diameter material.
// ---------------------------------------------------------------------------
module post_solid() {
    union() {
        cylinder(h = TAPER_START_Z - POST_FOOT_Z, r = POST_LOWER_R);
        translate([0, 0, TAPER_START_Z])
            cylinder(h = POST_TAPER_LEN, r1 = POST_LOWER_R, r2 = POST_UPPER_R);
        translate([0, 0, TAPER_END_Z])
            cylinder(h = POST_CAP_Z - TAPER_END_Z, r = POST_UPPER_R);
    }
}

// Short blind-ish hole anchored on the post's centreline axis at height z:
// extends just past the post's surface outward (so the wire has somewhere
// to plug in) without reaching all the way through to the far surface --
// deliberately SHORT (well under the post half-width) to avoid carving a
// disconnected sliver out of the thin post, per the schematic nature of
// this demonstration model.
module socket_bore(z, az_deg) {
    translate([0, 0, z])
        rotate([0, LEAN_ANG, az_deg])
            translate([0, 0, -SOCK_DEPTH/2])
                cylinder(h = SOCK_DEPTH, d = SOCK_D, center = true);
}

module post() {
    difference() {
        post_solid();
        socket_bore(POST_TOP_Z, 90 - AZ_SPLIT);
        socket_bore(POST_TOP_Z, 90 + AZ_SPLIT);
        socket_bore(POST_MID_Z, 90 - AZ_SPLIT);
        socket_bore(POST_MID_Z, 90 + AZ_SPLIT);
    }
}

// ---------------------------------------------------------------------------
// PART selector
// ---------------------------------------------------------------------------
if (PART == "post") {
    post();
} else if (PART == "spring_wire_nominal") {
    bowed_wire(SPRING_D, SPRING_L, SPRING_H_NOM);
} else if (PART == "spring_wire_deformed") {
    bowed_wire(SPRING_D, SPRING_L, SPRING_H_DEF);
} else if (PART == "ductile_wire_nominal") {
    bowed_wire(DUCTILE_D, DUCTILE_L, DUCTILE_H_NOM);
} else if (PART == "ductile_wire_deformed") {
    bowed_wire(DUCTILE_D, DUCTILE_L, DUCTILE_H_DEF);
} else {
    assert(false, str("Unknown PART: ", PART));
}
